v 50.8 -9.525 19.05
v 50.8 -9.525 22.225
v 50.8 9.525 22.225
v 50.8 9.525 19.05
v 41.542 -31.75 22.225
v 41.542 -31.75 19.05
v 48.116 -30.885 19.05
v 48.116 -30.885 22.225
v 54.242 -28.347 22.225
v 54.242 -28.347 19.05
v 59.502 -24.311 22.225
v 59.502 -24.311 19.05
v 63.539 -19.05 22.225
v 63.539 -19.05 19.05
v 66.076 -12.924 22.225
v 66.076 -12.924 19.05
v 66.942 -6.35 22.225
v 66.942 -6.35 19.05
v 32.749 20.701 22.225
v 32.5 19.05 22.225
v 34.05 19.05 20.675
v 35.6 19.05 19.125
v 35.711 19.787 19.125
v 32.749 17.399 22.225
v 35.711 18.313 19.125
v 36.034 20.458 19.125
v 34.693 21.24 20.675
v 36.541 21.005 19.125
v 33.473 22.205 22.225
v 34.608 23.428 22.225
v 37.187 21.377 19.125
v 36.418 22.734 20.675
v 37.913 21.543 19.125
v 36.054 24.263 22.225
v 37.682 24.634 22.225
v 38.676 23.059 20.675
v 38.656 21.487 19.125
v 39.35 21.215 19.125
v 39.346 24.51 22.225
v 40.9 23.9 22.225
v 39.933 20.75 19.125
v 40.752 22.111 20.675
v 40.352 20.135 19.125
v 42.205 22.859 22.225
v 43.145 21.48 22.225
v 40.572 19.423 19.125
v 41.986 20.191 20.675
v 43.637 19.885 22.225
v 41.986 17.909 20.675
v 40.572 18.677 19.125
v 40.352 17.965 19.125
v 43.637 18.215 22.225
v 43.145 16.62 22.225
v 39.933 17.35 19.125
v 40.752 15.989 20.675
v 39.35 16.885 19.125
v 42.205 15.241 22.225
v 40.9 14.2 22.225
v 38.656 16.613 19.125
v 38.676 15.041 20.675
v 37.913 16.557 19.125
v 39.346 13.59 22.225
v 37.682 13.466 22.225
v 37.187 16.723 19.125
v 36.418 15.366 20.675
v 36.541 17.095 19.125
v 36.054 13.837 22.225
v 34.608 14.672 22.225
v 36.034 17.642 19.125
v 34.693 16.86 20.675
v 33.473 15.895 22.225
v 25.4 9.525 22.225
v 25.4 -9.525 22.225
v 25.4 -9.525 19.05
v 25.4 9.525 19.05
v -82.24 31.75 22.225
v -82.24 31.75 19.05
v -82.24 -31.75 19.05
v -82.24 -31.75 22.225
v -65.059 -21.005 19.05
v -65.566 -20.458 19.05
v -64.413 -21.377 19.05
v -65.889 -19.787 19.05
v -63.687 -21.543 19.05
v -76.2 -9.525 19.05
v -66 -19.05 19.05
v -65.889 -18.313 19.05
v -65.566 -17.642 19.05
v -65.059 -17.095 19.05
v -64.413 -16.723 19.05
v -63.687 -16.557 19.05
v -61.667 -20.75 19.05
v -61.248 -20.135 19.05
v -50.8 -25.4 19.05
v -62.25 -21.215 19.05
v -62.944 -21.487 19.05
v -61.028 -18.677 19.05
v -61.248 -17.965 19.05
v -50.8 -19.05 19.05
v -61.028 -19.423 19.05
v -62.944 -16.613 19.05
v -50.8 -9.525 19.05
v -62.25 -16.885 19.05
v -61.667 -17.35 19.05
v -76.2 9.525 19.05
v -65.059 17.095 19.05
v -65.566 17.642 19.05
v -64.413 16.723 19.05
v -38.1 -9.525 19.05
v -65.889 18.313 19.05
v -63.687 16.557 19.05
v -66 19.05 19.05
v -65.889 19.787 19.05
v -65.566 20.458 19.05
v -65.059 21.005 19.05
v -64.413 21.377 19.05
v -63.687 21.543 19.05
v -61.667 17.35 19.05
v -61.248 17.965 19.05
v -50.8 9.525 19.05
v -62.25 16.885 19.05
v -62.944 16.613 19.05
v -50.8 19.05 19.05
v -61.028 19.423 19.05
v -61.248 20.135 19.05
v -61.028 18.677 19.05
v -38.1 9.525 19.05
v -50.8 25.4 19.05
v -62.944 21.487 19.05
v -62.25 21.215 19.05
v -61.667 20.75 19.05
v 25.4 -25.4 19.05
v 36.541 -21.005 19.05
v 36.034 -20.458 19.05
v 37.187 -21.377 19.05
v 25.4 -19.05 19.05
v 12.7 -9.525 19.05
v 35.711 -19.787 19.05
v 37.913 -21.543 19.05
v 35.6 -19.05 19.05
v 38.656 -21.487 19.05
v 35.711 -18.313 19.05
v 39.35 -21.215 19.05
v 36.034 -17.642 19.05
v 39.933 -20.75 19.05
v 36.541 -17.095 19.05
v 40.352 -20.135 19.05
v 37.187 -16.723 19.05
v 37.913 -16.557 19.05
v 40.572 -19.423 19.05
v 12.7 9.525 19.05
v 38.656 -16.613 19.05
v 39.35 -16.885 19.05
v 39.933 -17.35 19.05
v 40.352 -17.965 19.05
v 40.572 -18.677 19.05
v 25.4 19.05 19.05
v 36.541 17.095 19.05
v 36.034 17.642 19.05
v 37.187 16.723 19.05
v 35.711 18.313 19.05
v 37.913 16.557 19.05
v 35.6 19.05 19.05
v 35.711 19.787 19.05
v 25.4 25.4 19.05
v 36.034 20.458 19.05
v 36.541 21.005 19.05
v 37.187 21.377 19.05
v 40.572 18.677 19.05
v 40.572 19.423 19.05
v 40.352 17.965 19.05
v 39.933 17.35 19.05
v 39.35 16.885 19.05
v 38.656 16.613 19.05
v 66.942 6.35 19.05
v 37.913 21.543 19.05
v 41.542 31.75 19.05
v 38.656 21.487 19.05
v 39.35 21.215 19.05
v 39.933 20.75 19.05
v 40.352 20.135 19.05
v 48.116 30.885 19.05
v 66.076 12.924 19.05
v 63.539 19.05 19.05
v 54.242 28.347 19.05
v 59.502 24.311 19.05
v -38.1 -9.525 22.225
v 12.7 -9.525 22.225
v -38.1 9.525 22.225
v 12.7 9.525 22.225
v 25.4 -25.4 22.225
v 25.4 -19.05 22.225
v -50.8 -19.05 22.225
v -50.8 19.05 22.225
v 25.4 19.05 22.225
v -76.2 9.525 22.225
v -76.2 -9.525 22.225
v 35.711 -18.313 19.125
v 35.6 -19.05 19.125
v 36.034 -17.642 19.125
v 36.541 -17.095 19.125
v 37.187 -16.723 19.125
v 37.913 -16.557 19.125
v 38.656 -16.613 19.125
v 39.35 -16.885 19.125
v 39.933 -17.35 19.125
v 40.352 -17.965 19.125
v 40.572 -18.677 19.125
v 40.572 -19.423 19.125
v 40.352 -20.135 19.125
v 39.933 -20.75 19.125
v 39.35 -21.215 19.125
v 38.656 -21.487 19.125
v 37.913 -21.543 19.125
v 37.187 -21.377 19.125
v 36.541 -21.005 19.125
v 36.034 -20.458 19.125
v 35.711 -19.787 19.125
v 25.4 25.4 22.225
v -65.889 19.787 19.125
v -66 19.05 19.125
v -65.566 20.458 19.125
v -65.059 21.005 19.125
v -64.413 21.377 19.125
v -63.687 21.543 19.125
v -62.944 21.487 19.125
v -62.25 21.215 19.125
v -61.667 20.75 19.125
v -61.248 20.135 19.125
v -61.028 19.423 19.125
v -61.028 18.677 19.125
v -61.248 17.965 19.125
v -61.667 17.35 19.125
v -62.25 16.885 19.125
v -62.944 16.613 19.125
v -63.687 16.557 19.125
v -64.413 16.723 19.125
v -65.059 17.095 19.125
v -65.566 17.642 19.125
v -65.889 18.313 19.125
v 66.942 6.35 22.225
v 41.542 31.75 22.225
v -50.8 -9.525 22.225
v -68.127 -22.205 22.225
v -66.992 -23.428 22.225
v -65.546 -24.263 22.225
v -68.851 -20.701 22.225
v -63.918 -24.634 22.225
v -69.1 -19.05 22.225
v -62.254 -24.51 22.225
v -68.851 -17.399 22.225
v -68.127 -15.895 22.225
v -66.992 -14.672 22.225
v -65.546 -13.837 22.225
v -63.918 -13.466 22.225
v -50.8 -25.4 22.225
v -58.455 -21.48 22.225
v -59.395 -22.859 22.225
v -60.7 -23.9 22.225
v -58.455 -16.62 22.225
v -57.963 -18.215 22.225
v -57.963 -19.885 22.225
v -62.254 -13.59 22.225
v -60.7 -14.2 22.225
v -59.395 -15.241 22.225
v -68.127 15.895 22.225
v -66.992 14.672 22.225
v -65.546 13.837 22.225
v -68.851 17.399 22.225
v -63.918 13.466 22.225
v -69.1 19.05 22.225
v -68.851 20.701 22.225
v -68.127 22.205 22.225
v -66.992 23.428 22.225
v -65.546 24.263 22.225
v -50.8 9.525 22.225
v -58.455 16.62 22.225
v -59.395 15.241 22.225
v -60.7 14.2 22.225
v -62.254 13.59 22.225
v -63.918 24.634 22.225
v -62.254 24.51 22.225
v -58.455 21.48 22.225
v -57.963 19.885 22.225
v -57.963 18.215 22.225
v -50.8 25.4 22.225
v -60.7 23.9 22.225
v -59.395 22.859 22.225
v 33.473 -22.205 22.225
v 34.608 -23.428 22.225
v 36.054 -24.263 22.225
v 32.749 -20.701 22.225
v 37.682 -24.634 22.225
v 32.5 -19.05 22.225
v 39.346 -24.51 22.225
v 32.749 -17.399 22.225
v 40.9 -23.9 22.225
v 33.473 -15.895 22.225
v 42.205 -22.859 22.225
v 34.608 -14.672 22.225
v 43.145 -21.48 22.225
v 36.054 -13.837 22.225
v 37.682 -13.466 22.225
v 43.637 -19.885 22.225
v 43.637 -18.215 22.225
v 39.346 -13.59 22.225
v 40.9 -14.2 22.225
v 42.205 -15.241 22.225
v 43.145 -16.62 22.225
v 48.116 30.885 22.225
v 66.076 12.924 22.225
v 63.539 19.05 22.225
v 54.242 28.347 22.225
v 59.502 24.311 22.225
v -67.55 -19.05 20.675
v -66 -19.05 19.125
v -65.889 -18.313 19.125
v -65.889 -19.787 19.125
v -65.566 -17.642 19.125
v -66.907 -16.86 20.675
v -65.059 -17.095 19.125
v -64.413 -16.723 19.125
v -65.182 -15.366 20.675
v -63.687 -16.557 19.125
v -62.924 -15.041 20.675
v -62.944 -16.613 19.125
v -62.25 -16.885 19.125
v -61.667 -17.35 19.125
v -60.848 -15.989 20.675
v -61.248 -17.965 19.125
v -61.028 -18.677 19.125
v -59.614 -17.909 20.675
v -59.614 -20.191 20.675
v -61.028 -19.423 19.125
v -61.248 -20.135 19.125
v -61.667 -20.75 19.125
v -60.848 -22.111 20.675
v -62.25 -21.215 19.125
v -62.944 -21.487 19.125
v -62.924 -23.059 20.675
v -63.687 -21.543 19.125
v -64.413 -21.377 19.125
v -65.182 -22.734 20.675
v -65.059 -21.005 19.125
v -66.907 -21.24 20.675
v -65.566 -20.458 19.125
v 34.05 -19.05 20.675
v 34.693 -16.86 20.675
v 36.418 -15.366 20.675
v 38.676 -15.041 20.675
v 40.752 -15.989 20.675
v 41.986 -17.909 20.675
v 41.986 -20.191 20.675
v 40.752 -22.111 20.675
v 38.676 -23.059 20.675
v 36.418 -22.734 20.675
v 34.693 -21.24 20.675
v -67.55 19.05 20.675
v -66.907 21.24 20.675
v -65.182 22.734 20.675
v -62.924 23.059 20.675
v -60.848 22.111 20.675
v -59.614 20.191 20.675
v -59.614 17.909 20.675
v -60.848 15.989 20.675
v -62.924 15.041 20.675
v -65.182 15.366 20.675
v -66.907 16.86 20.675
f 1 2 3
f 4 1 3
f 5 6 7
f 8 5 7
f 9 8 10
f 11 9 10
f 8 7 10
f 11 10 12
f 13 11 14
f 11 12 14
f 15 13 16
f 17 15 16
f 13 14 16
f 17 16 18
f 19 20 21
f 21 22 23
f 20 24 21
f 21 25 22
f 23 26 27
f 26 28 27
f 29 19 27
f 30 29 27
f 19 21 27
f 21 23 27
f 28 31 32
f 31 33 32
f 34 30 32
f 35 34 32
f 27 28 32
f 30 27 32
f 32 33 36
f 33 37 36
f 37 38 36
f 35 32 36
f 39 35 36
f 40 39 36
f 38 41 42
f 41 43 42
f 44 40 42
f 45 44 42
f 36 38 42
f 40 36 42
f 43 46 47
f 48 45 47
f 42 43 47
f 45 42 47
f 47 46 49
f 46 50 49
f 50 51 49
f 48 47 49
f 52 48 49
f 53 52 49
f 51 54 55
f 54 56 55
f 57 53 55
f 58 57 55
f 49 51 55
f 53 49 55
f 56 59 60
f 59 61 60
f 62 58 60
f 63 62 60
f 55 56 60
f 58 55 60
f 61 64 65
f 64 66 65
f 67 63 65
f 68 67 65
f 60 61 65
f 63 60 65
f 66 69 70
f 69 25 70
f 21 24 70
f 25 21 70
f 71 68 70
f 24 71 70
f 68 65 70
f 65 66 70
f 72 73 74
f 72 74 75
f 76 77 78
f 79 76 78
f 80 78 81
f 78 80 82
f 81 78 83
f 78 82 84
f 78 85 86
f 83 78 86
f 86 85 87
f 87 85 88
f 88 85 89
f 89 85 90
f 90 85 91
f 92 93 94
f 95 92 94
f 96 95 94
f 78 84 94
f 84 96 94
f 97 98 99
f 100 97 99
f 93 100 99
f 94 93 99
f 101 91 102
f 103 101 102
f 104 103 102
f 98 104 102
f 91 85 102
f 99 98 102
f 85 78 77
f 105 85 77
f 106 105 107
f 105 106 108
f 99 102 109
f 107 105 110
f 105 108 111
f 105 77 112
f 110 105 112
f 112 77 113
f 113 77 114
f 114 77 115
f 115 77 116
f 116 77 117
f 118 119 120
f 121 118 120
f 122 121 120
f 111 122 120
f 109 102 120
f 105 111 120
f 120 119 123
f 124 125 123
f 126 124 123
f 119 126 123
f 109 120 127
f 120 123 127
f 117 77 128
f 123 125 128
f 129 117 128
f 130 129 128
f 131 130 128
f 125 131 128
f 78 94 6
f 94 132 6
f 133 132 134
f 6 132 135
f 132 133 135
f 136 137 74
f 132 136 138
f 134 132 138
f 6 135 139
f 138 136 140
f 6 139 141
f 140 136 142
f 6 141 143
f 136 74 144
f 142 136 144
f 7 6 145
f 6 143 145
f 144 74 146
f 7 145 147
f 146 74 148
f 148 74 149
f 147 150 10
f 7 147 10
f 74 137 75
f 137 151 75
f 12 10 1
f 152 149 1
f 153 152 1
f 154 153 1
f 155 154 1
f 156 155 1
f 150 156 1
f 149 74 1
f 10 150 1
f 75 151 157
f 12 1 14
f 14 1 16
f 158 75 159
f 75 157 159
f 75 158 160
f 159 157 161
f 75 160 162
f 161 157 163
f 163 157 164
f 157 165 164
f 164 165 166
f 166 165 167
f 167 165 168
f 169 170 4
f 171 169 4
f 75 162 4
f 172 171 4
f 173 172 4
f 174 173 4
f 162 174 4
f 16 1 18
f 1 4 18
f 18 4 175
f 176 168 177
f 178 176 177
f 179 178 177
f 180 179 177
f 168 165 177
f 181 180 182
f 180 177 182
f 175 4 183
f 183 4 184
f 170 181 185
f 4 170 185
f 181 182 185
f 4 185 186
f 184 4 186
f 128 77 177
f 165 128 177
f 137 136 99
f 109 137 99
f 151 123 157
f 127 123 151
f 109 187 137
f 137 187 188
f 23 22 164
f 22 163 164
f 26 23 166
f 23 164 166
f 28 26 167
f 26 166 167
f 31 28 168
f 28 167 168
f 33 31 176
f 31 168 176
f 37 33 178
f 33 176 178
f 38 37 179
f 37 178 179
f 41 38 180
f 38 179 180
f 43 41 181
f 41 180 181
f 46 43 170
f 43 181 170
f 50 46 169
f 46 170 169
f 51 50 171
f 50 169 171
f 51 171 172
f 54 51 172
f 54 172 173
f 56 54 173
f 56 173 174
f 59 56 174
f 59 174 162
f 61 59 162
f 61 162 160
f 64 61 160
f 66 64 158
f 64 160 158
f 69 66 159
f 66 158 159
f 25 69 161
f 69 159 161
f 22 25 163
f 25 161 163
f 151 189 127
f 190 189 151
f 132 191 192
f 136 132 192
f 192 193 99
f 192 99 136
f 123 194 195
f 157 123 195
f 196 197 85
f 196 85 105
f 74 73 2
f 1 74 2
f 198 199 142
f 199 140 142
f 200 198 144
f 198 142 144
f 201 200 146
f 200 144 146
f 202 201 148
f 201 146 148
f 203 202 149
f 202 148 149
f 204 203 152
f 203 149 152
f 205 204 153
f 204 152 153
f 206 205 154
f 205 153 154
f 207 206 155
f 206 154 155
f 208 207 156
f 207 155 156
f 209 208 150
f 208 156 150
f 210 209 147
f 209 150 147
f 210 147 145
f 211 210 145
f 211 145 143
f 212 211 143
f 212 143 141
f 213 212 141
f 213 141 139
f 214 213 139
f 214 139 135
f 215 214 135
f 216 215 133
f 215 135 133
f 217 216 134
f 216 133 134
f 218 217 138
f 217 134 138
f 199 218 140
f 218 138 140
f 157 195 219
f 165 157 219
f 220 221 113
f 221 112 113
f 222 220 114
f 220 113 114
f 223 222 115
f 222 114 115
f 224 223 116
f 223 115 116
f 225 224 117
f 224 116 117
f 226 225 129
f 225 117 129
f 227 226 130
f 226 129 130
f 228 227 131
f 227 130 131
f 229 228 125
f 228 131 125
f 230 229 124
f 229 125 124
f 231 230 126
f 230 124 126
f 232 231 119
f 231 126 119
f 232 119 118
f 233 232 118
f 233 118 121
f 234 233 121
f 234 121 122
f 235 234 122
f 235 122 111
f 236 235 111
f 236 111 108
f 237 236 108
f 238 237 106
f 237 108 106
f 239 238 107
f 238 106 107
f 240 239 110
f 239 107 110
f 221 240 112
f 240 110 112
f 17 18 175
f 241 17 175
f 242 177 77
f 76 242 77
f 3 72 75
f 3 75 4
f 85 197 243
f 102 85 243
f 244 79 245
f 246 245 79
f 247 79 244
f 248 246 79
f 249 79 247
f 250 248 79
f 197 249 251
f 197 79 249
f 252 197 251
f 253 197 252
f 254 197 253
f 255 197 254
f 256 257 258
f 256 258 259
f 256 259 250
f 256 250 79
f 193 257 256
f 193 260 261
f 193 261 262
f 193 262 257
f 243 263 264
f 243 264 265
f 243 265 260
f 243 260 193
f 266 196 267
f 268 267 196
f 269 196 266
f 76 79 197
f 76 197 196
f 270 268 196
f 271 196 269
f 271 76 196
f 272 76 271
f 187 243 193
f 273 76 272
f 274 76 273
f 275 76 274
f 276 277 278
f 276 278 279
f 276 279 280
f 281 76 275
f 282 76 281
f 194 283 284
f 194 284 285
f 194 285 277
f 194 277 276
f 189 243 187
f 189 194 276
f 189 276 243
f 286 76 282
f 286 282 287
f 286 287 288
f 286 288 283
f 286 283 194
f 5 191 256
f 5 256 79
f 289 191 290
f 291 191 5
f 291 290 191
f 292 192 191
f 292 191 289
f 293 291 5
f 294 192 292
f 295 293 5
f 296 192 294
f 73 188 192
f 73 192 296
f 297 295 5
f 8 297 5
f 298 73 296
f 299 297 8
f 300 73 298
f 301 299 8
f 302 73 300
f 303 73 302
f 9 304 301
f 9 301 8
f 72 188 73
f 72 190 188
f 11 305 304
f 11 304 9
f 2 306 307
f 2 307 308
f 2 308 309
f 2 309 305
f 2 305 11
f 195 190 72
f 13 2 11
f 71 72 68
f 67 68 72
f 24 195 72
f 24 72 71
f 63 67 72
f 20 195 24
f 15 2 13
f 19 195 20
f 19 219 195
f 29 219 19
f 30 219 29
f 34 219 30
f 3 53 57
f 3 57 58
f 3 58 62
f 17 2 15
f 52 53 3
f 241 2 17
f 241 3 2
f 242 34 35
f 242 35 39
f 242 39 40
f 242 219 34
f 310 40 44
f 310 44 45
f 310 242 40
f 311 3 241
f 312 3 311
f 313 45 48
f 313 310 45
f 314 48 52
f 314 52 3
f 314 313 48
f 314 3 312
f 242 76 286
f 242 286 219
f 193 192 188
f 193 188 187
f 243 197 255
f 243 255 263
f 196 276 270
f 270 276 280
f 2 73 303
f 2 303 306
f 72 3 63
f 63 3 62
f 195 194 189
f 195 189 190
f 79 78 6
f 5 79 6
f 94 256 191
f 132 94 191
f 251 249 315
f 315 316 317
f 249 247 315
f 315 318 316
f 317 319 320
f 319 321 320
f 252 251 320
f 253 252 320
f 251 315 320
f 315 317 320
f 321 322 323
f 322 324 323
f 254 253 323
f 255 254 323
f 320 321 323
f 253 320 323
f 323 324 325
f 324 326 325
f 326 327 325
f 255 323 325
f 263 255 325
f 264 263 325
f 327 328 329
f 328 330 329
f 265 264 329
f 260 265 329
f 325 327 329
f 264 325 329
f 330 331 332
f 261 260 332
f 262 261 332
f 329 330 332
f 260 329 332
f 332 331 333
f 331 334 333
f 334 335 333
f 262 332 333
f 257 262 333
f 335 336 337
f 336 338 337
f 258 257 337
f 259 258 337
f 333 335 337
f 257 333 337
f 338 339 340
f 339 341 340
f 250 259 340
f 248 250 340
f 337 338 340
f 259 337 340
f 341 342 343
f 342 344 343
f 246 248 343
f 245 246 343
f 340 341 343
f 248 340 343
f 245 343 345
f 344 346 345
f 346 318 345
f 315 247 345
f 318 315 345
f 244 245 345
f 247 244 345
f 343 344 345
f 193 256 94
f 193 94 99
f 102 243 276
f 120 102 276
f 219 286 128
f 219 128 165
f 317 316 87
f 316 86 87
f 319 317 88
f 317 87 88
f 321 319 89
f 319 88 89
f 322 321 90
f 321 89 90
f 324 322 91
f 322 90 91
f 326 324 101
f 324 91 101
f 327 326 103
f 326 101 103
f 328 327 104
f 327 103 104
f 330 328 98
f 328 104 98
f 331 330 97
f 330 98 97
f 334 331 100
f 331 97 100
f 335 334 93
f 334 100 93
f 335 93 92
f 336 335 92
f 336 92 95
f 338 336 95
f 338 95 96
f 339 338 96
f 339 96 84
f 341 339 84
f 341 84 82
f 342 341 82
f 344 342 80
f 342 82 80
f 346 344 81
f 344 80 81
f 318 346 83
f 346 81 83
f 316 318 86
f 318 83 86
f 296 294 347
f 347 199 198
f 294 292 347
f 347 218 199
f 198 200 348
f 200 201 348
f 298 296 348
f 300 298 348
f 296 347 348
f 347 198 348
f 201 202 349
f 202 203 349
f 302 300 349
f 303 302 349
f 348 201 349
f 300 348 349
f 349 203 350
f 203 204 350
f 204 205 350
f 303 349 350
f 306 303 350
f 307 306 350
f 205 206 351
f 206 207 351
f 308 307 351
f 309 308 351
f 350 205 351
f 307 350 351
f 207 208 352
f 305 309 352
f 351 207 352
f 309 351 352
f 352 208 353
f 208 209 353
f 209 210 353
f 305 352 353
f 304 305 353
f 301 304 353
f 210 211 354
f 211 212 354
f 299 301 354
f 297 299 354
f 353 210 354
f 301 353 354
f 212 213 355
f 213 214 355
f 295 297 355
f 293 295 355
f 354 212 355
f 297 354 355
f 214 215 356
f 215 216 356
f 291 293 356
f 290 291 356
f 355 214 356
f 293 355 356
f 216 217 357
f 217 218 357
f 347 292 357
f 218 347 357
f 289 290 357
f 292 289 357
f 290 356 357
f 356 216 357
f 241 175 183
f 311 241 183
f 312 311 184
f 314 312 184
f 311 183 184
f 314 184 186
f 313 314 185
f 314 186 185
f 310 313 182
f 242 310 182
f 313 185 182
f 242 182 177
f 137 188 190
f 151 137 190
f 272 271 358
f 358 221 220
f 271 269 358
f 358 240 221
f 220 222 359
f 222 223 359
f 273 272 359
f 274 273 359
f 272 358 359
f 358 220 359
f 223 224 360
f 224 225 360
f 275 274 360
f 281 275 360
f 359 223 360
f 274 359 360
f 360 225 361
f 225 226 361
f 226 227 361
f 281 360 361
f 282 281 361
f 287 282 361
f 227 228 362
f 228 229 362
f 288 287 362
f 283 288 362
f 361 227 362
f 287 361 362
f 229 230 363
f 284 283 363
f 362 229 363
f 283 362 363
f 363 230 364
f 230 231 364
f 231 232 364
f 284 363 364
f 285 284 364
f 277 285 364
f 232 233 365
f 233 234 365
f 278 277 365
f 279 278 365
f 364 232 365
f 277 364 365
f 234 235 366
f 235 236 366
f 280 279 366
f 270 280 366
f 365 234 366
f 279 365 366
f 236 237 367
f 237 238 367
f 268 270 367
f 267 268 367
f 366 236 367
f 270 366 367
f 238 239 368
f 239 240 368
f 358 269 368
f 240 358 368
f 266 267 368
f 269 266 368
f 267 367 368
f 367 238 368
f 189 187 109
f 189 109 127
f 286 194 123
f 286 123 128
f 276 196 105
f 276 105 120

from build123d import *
from build123d import SkipClean  # not in build123d's __all__

# Parameters (mm, degrees)
F1_DEPTH        = 31.75
F1_DEPTH_BACK   = 31.75
F3_R            = 6.35
F4_DEPTH        = 149.1828857926
F5_R            = 12.7
F6_DEPTH        = 25.4
F7_R            = 9.525
F8_DEPTH        = 44.45
F8_DEPTH_BACK   = 66.9427915833
F10_D           = 4.2
F10_DEPTH       = 25.4
F10_TIP         = 1.2618073
F12_DEPTH       = 3.175
F14_D           = 5
F14_CSINK_D     = 11.2
F14_CSINK_ANGLE = 90
F15_W           = 25.4
F15_H           = 19.05
F15_W_2         = 76.2
F15_H_2         = 6.35
F15_W_3         = 50.8
F16_DEPTH       = 41.2760001


# Not quite as in the source:
# - a feature of the source that left no trace in its solid (it failed there, or was rolled back) is left out


with BuildPart() as f1:
    # F0 (on Front) → F1 (new body, two sides)
    with BuildSketch(Plane.XZ) as f1_sk:
        with BuildLine():
            Line((66.9417914833, 19.05), (-82.2400942093, 19.05))
            Line((-82.2400942093, 19.05), (-82.2400942093, -19.05))
            add(Edge.make_bspline(
                [(-82.2400942093, -19.05), (0, -19.05), (66.9417914833, -19.05), (66.9417914833, 19.05)],
                knots=[0, 0, 0, 0, 153.970273166, 153.970273166, 153.970273166, 153.970273166], degree=3))
        make_face()
    extrude(amount=F1_DEPTH)
    extrude(f1_sk.sketch, amount=-F1_DEPTH_BACK)

    # F3 (on face) → F4 (cut, through all)
    with BuildSketch(Plane(origin=(-82.2400942093, 0, 0), x_dir=(0, -1, 0), z_dir=(-1, 0, 0))):
        Circle(F3_R)
    extrude(amount=-F4_DEPTH, mode=Mode.SUBTRACT)

    # F5 (on face) → F6 (cut)
    with BuildSketch(Plane(origin=(-82.2400942093, 0, 0), x_dir=(0, -1, 0), z_dir=(-1, 0, 0))):
        Circle(F5_R)
    extrude(amount=-F6_DEPTH, mode=Mode.SUBTRACT)

    # F7 (on Right) → F8 (cut, two sides)
    with BuildSketch(Plane.YZ) as f8_sk:
        Circle(F7_R)
    extrude(amount=-F8_DEPTH, mode=Mode.SUBTRACT)
    extrude(f8_sk.sketch, amount=F8_DEPTH_BACK, mode=Mode.SUBTRACT)

    # F10
    with Locations(Plane.XY.offset(19.05)):
        with Locations((-63.5, 19.05), (-63.5, -19.05), (25.4, 19.05), (25.4, -19.05)):
            Hole(F10_D / 2, depth=F10_DEPTH)
            with Locations((0, 0, -(F10_DEPTH + F10_TIP / 2))):  # 118° drill point
                Cone(0, F10_D / 2, F10_TIP, mode=Mode.SUBTRACT)


with BuildPart() as f12:
    # F11 (on face) → F12 (new body)
    with BuildSketch(Plane.XY.offset(19.05)):
        with BuildLine():
            Line((41.5417914833, 31.75), (-82.2400942093, 31.75))
            Line((-82.2400942093, 31.75), (-82.2400942093, -31.75))
            Line((-82.2400942093, -31.75), (41.5417914833, -31.75))
            ThreePointArc((41.5417914833, -31.75), (59.5023037254, -24.3105122421), (66.9417914833, -6.35))
            Line((66.9417914833, -6.35), (66.9417914833, 6.35))
            ThreePointArc((66.9417914833, 6.35), (59.5023037254, 24.3105122421), (41.5417914833, 31.75))
        make_face()
    extrude(amount=F12_DEPTH)

    # F14 (through all)
    with Locations(Plane.XY.offset(22.225)):
        with Locations((-63.5, 19.05), (-63.5, -19.05), (38.1, -19.05), (38.1, 19.05)):
            CounterSinkHole(F14_D / 2, F14_CSINK_D / 2, counter_sink_angle=F14_CSINK_ANGLE)


with BuildPart() as f16_tool:
    # F15 (on face) → F16 (new body, through all)
    with BuildSketch(Plane.XY.offset(22.225)):
        with Locations((-63.5, 0)):
            Rectangle(F15_W, F15_H)
        with Locations((38.1, 0)):
            Rectangle(F15_W, F15_H)
        with Locations((-12.7, 22.225)):
            Rectangle(F15_W_2, F15_H_2)
        with Locations((-12.7, -22.225)):
            Rectangle(F15_W_2, F15_H_2)
        with Locations((-12.7, 0)):
            Rectangle(F15_W_3, F15_H)
    extrude(amount=-F16_DEPTH)


with BuildPart() as f1_1:
    add(f1.part, clean=False)

    # F16: cut by f16_tool
    with SkipClean():  # cleaning this boolean's faces spoils the solid; the shape is the same uncleaned
        add(f16_tool.part, mode=Mode.SUBTRACT)


with BuildPart() as f12_1:
    add(f12.part, clean=False)

    # F16: cut by f16_tool
    with SkipClean():  # cleaning this boolean's faces spoils the solid; the shape is the same uncleaned
        add(f16_tool.part, mode=Mode.SUBTRACT)


solid = f12_1.part
